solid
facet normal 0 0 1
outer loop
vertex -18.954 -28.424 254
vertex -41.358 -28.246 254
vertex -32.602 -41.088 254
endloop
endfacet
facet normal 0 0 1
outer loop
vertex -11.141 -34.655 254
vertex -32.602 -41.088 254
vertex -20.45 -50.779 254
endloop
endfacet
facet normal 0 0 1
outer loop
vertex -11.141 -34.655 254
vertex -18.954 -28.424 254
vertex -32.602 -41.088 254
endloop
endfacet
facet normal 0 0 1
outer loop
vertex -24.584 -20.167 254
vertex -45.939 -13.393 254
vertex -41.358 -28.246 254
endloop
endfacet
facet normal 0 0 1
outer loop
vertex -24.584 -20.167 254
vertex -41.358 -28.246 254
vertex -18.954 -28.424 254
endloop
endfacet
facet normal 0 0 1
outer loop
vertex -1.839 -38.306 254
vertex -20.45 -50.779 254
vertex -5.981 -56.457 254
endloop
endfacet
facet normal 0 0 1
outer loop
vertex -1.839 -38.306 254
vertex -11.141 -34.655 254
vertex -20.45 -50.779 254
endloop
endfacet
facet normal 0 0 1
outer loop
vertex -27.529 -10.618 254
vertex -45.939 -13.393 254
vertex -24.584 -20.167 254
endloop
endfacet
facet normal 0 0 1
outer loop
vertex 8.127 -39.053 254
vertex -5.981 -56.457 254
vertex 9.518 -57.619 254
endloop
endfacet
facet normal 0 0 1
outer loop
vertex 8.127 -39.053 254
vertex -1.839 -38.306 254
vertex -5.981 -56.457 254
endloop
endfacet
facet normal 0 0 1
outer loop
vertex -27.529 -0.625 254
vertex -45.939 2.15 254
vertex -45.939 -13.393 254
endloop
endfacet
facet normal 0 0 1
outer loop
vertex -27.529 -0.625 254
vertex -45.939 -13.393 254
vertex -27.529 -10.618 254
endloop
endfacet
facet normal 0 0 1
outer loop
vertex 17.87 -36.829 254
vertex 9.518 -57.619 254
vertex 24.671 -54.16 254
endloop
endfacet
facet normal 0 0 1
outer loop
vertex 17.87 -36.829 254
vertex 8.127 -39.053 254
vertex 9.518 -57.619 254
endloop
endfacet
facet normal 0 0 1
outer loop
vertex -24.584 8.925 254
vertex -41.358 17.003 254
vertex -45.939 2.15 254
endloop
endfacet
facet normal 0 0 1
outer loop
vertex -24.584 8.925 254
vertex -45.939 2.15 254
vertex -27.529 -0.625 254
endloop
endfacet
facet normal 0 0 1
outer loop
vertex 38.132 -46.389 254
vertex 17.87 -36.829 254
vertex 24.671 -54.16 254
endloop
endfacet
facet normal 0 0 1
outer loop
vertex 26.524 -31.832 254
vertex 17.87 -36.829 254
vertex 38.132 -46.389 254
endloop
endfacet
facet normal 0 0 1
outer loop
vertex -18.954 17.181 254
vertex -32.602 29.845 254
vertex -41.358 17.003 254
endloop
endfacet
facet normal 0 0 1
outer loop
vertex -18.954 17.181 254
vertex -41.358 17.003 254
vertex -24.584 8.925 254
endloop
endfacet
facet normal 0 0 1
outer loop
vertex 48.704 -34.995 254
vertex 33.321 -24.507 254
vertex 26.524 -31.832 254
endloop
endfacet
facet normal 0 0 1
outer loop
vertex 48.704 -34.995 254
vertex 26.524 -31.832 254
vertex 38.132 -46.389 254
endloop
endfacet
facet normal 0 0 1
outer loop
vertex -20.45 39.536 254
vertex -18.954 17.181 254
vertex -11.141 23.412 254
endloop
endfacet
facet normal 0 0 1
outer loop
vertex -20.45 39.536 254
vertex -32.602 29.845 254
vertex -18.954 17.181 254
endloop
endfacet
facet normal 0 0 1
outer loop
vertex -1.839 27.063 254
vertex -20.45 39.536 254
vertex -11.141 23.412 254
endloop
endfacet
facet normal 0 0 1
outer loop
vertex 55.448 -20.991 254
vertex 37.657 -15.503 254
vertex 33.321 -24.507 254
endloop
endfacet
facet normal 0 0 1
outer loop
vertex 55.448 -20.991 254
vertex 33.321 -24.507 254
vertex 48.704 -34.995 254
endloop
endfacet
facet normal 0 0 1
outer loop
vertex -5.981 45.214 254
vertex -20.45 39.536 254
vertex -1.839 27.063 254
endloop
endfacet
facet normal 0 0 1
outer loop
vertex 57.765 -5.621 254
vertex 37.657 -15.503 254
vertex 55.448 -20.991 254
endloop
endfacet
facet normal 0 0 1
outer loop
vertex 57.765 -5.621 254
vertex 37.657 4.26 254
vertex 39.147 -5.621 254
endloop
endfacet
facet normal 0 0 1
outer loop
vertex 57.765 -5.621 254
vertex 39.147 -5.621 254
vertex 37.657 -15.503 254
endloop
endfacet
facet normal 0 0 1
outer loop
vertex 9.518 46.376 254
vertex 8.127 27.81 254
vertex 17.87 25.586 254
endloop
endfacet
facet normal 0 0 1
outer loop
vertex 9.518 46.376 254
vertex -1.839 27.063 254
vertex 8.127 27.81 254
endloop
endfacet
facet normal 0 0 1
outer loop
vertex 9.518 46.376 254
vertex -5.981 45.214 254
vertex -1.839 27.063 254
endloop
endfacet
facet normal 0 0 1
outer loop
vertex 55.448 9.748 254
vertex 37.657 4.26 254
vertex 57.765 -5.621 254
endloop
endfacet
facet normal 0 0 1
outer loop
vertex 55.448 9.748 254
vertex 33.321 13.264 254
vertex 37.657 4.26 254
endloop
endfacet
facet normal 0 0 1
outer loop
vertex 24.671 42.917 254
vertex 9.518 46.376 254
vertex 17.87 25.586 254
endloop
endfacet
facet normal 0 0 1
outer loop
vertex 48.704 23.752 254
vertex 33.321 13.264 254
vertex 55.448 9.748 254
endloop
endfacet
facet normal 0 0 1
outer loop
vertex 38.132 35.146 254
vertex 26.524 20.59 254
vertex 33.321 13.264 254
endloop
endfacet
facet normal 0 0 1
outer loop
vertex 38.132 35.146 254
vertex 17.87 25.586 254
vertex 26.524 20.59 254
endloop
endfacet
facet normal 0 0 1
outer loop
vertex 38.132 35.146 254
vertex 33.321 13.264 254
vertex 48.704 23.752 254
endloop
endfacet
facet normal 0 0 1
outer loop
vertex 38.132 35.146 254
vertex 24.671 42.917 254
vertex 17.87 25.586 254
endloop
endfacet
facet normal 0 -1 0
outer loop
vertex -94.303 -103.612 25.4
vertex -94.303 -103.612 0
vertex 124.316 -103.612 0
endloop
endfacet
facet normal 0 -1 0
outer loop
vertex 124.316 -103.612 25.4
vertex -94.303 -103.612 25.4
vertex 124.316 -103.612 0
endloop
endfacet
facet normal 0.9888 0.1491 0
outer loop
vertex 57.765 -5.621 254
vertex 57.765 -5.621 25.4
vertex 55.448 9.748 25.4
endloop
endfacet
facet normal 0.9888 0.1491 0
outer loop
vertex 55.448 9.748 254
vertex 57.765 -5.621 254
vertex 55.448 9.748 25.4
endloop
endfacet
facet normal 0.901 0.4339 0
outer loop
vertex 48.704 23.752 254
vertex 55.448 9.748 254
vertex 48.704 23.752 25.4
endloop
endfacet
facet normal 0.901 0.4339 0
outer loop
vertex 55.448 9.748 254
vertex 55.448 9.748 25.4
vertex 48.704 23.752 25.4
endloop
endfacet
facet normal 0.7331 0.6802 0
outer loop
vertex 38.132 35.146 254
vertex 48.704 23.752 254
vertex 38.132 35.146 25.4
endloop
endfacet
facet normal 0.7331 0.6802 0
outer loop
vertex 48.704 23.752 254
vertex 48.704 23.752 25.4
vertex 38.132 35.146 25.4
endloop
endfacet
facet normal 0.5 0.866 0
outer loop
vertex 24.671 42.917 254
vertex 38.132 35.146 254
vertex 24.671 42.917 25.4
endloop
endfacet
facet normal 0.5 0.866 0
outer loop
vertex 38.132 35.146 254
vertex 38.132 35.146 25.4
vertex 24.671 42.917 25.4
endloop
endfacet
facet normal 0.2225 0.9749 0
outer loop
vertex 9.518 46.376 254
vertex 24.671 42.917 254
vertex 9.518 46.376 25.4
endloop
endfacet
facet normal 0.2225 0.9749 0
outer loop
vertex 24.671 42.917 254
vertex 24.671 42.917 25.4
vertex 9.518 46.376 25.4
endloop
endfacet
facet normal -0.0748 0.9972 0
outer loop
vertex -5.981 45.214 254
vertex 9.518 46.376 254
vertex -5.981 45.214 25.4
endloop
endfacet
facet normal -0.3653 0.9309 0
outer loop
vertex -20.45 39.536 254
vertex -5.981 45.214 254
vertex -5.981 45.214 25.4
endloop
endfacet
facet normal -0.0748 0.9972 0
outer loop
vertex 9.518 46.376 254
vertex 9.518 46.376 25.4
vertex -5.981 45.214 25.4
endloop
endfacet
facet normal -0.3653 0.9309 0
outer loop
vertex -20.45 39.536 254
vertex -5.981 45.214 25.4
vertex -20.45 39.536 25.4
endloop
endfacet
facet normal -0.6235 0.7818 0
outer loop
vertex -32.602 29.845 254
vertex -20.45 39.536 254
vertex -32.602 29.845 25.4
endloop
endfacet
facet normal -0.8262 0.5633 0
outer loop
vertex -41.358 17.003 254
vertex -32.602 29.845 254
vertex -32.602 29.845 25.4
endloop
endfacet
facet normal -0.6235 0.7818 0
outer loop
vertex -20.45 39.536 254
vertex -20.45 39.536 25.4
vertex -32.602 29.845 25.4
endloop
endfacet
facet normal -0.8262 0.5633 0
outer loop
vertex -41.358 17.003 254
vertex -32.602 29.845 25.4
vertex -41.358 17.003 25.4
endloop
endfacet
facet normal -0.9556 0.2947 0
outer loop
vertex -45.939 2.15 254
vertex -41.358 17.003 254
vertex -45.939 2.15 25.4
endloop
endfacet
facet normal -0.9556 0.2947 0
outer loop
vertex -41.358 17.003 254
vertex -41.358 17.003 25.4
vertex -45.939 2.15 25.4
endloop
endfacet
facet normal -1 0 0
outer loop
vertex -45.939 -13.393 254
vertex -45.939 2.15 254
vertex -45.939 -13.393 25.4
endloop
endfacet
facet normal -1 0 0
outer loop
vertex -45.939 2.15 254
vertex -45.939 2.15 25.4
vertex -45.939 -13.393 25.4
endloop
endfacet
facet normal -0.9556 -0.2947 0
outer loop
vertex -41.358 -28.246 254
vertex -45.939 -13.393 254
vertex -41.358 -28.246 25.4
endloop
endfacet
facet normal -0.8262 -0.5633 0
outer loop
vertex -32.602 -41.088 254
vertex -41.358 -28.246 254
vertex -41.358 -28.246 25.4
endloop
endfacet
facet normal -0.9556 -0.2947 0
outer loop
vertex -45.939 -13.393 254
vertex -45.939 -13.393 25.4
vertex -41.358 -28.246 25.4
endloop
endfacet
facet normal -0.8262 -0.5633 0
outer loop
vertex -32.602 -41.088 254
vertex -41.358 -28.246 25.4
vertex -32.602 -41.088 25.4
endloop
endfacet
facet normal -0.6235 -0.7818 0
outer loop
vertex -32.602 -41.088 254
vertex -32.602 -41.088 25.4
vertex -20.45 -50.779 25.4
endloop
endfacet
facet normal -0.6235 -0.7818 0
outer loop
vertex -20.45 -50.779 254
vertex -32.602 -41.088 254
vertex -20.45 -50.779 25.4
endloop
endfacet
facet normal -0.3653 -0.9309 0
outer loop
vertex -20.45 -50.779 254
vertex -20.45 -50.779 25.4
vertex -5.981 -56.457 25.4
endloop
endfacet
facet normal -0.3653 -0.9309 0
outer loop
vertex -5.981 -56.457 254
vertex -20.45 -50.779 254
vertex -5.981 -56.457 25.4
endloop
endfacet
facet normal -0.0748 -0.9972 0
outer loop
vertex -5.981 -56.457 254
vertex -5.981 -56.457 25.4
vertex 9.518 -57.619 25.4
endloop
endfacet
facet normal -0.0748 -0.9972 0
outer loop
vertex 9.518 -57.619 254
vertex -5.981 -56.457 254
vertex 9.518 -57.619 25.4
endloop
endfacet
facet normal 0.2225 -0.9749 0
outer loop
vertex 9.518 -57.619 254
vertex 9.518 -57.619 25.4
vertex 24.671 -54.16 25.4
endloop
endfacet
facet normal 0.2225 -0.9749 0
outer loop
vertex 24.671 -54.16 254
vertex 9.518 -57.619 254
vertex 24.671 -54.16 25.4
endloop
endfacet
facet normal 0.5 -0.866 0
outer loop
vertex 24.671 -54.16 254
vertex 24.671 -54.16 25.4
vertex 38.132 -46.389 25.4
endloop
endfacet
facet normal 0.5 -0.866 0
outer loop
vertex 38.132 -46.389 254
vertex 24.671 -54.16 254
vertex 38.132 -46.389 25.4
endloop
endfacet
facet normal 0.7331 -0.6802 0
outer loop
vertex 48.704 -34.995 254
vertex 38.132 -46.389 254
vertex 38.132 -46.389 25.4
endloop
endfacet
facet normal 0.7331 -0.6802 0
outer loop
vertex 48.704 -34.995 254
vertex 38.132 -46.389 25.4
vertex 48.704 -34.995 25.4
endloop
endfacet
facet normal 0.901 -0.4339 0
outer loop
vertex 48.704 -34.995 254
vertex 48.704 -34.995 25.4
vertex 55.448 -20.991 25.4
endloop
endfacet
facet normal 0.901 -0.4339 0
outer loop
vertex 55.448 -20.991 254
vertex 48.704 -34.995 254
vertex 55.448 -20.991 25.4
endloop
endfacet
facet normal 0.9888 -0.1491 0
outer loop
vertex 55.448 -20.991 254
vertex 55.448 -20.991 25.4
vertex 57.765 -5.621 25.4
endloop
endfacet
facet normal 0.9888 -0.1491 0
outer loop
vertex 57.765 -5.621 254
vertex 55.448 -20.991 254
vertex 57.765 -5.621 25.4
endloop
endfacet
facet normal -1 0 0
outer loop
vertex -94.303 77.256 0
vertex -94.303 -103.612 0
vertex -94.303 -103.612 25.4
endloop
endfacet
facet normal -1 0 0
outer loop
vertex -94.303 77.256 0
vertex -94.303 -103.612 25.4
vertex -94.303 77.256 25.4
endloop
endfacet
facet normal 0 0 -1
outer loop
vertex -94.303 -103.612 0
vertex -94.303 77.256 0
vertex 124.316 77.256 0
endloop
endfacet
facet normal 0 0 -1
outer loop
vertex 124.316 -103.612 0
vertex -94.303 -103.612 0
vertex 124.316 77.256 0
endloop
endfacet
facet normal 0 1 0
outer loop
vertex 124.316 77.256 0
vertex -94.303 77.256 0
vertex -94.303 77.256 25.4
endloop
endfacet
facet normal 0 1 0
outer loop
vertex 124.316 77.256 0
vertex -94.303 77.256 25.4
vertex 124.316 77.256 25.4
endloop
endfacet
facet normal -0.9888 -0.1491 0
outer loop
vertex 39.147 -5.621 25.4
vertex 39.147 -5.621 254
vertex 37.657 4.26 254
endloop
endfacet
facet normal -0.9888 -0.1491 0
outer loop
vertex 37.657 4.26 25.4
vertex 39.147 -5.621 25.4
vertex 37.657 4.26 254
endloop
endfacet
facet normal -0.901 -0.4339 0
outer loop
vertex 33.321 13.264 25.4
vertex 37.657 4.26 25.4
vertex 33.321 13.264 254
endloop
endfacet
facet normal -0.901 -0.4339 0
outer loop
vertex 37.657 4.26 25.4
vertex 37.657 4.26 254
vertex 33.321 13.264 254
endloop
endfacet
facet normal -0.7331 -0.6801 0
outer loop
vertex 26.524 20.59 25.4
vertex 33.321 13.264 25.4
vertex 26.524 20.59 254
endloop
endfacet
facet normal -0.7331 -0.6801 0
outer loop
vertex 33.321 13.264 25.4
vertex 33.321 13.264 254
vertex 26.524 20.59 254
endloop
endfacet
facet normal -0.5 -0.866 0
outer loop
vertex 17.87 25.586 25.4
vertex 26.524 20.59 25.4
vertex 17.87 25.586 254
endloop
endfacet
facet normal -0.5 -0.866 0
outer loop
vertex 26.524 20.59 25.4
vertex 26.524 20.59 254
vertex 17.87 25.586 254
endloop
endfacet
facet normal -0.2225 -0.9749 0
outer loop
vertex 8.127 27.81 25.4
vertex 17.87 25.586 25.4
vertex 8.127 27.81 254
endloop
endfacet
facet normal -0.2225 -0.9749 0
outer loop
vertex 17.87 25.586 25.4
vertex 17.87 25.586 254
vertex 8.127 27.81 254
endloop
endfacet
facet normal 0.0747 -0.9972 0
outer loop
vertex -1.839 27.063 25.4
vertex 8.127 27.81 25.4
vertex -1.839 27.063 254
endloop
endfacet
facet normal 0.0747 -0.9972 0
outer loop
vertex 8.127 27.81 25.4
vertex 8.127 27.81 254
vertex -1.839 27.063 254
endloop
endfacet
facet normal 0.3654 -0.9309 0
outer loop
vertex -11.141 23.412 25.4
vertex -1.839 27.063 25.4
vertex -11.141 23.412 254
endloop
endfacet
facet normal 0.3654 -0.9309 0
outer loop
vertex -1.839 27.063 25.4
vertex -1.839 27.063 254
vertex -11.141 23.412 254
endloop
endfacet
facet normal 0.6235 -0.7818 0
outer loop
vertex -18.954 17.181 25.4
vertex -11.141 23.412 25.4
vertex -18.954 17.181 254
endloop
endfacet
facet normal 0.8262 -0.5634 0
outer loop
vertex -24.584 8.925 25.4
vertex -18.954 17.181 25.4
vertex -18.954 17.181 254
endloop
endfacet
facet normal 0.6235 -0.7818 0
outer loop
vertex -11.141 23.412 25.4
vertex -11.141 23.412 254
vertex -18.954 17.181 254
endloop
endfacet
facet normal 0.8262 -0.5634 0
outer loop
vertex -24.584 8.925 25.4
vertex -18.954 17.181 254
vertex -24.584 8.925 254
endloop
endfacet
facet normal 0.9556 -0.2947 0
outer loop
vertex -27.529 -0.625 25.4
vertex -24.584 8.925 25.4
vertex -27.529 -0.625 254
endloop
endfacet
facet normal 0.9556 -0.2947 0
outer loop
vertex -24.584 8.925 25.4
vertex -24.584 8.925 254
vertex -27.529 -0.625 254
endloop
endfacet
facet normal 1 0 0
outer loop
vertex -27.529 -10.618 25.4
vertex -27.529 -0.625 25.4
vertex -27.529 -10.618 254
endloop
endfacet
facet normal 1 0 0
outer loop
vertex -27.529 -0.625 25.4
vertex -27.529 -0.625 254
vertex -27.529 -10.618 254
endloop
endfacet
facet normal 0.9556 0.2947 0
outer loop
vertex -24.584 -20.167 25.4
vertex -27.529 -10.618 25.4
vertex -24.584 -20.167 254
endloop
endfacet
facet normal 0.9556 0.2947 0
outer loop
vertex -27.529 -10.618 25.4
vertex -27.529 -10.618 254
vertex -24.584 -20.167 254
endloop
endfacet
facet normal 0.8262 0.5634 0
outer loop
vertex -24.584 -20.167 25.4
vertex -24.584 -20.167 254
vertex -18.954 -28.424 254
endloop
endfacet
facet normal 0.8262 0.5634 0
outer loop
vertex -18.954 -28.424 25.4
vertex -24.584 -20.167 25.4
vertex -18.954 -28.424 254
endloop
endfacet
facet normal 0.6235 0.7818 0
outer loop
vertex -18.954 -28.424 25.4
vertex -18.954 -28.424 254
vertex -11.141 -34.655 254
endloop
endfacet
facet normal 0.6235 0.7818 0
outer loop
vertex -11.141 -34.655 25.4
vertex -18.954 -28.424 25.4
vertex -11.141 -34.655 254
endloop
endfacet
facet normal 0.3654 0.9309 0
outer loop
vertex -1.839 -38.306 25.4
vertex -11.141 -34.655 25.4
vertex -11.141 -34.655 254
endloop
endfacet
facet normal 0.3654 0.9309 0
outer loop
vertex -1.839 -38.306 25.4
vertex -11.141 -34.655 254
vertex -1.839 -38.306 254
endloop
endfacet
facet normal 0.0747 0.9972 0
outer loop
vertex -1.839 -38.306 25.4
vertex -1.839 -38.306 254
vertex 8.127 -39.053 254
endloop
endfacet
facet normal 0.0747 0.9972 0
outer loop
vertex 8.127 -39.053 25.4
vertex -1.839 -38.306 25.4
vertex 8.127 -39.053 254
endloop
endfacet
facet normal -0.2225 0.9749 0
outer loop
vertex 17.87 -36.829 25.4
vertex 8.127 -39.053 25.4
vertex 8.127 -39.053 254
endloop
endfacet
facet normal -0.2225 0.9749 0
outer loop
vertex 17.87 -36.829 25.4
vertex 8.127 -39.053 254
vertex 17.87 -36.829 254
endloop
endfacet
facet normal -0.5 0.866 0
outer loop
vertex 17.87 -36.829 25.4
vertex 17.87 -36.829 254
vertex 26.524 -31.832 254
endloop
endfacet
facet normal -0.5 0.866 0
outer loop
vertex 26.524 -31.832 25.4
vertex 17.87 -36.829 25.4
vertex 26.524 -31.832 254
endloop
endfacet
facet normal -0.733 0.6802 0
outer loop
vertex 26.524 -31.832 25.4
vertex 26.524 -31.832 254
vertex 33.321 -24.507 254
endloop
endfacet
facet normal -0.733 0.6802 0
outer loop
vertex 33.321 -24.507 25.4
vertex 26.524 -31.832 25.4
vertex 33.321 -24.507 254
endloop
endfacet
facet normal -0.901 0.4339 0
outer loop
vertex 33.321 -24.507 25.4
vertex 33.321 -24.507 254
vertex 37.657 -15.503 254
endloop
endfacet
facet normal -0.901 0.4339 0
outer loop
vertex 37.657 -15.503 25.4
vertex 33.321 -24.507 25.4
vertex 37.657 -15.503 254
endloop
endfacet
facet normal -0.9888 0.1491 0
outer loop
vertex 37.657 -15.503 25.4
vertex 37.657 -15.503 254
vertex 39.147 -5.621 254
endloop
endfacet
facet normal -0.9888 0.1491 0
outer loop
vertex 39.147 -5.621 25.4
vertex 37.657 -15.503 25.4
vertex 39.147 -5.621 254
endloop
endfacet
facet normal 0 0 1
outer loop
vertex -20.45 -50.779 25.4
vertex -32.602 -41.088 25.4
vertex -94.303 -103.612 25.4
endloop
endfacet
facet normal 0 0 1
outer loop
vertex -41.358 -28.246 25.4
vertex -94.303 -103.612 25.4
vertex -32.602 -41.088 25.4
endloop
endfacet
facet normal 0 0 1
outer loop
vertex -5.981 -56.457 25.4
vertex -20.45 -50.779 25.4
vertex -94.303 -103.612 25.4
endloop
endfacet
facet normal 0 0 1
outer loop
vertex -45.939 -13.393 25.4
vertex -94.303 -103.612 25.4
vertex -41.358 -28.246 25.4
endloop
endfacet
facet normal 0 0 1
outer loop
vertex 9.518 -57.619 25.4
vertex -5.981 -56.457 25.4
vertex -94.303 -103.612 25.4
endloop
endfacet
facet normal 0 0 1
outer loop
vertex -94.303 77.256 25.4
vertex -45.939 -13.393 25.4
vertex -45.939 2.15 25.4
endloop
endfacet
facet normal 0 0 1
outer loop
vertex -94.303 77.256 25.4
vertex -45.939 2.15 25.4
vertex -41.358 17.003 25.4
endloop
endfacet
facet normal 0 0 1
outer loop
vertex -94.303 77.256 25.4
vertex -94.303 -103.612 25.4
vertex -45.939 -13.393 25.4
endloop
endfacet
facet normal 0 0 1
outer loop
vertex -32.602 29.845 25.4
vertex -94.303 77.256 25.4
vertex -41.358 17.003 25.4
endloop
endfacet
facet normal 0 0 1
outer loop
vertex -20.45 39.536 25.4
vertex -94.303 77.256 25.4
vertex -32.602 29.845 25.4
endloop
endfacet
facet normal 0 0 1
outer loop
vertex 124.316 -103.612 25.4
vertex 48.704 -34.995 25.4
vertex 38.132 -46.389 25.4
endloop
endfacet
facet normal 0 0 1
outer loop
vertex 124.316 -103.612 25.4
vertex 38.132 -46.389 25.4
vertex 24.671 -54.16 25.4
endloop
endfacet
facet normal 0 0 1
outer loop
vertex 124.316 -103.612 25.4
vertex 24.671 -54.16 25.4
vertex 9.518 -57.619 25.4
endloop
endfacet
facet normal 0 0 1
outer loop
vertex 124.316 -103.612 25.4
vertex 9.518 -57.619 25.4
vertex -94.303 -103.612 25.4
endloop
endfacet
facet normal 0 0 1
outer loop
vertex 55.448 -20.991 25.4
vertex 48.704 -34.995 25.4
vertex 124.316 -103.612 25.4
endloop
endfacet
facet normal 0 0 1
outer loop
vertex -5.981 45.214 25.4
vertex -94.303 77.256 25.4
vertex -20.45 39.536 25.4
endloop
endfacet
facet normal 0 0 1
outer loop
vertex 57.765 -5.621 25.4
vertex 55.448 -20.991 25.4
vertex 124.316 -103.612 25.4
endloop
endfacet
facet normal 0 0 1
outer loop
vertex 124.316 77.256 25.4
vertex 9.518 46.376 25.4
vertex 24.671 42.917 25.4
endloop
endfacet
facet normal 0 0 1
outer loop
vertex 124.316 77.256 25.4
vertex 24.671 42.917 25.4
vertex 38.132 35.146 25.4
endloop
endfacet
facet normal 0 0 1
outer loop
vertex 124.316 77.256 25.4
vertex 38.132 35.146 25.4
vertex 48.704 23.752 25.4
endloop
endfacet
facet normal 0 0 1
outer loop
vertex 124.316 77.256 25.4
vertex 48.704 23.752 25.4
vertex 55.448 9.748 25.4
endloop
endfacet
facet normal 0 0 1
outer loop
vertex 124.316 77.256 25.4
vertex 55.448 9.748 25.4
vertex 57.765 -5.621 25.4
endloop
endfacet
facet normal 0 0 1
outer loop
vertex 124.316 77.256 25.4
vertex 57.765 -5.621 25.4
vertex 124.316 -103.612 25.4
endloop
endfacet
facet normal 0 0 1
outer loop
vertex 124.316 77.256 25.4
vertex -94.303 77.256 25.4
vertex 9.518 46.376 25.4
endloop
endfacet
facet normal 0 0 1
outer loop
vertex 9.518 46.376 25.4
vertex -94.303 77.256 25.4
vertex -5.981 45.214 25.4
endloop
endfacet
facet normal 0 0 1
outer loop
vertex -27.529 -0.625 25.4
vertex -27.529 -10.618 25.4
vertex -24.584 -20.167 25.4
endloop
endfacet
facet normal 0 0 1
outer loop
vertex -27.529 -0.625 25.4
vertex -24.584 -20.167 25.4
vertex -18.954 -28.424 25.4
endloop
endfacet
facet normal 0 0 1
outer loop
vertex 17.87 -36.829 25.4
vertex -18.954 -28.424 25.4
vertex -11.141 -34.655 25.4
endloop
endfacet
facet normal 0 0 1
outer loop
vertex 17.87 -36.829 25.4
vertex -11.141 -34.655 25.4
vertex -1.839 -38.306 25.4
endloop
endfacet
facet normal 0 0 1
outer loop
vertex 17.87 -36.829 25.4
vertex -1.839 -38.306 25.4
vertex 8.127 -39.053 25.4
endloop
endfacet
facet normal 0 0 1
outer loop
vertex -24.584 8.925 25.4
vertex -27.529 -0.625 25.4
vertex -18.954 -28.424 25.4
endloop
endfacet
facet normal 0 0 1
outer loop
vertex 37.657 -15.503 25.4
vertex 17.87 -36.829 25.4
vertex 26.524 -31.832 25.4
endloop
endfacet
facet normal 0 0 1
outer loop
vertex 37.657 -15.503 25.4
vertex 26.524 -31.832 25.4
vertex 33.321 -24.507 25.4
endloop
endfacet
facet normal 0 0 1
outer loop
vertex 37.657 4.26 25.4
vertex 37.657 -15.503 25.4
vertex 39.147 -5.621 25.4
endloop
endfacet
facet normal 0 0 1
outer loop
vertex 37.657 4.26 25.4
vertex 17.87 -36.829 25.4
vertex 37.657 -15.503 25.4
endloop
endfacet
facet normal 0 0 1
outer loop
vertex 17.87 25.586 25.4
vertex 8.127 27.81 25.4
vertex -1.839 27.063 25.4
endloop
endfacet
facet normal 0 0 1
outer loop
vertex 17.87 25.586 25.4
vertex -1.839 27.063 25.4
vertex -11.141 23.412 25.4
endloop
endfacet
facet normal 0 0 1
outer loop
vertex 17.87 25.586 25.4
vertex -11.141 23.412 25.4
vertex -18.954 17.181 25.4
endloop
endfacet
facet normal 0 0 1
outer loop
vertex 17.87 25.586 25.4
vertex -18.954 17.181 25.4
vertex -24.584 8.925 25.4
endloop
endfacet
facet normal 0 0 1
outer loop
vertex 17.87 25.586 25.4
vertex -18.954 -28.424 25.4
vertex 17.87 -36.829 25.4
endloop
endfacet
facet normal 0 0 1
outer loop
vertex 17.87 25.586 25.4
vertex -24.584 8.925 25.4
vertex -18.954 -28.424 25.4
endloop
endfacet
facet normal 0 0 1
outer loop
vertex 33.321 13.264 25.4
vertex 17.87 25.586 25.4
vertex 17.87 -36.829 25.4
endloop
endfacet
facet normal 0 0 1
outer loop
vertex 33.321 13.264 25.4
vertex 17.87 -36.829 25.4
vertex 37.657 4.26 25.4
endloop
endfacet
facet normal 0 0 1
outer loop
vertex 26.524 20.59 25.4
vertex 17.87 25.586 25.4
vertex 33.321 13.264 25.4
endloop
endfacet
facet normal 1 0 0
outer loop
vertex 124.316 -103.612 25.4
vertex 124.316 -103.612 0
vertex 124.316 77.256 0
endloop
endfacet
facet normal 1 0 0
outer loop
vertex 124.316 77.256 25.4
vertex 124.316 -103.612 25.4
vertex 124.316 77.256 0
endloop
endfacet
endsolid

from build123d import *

# Parameters (mm, degrees)
F0_R     = 52.143145
F1_DEPTH = 254
F2_R     = 33.525148
F3_DEPTH = 254.001
F4_W     = 218.61928
F4_H     = 180.868745
F5_DEPTH = 25.4


with BuildPart() as f1:
    # F0 (on Top) → F1 (new body)
    with BuildSketch(Plane.XY):
        with Locations((5.621463, -5.621463)):
            Circle(F0_R)
    extrude(amount=F1_DEPTH)

    # F2 (on face) → F3 (cut, through all)
    with BuildSketch(Plane.XY.offset(254)):
        with Locations((5.621463, -5.621463)):
            Circle(F2_R)
    extrude(amount=-F3_DEPTH, mode=Mode.SUBTRACT)

    # F4 (on Top) → F5 (join)
    with BuildSketch(Plane.XY):
        with Locations((15.006397, -13.178111)):
            Rectangle(F4_W, F4_H)
    extrude(amount=F5_DEPTH)


solid = f1.part
